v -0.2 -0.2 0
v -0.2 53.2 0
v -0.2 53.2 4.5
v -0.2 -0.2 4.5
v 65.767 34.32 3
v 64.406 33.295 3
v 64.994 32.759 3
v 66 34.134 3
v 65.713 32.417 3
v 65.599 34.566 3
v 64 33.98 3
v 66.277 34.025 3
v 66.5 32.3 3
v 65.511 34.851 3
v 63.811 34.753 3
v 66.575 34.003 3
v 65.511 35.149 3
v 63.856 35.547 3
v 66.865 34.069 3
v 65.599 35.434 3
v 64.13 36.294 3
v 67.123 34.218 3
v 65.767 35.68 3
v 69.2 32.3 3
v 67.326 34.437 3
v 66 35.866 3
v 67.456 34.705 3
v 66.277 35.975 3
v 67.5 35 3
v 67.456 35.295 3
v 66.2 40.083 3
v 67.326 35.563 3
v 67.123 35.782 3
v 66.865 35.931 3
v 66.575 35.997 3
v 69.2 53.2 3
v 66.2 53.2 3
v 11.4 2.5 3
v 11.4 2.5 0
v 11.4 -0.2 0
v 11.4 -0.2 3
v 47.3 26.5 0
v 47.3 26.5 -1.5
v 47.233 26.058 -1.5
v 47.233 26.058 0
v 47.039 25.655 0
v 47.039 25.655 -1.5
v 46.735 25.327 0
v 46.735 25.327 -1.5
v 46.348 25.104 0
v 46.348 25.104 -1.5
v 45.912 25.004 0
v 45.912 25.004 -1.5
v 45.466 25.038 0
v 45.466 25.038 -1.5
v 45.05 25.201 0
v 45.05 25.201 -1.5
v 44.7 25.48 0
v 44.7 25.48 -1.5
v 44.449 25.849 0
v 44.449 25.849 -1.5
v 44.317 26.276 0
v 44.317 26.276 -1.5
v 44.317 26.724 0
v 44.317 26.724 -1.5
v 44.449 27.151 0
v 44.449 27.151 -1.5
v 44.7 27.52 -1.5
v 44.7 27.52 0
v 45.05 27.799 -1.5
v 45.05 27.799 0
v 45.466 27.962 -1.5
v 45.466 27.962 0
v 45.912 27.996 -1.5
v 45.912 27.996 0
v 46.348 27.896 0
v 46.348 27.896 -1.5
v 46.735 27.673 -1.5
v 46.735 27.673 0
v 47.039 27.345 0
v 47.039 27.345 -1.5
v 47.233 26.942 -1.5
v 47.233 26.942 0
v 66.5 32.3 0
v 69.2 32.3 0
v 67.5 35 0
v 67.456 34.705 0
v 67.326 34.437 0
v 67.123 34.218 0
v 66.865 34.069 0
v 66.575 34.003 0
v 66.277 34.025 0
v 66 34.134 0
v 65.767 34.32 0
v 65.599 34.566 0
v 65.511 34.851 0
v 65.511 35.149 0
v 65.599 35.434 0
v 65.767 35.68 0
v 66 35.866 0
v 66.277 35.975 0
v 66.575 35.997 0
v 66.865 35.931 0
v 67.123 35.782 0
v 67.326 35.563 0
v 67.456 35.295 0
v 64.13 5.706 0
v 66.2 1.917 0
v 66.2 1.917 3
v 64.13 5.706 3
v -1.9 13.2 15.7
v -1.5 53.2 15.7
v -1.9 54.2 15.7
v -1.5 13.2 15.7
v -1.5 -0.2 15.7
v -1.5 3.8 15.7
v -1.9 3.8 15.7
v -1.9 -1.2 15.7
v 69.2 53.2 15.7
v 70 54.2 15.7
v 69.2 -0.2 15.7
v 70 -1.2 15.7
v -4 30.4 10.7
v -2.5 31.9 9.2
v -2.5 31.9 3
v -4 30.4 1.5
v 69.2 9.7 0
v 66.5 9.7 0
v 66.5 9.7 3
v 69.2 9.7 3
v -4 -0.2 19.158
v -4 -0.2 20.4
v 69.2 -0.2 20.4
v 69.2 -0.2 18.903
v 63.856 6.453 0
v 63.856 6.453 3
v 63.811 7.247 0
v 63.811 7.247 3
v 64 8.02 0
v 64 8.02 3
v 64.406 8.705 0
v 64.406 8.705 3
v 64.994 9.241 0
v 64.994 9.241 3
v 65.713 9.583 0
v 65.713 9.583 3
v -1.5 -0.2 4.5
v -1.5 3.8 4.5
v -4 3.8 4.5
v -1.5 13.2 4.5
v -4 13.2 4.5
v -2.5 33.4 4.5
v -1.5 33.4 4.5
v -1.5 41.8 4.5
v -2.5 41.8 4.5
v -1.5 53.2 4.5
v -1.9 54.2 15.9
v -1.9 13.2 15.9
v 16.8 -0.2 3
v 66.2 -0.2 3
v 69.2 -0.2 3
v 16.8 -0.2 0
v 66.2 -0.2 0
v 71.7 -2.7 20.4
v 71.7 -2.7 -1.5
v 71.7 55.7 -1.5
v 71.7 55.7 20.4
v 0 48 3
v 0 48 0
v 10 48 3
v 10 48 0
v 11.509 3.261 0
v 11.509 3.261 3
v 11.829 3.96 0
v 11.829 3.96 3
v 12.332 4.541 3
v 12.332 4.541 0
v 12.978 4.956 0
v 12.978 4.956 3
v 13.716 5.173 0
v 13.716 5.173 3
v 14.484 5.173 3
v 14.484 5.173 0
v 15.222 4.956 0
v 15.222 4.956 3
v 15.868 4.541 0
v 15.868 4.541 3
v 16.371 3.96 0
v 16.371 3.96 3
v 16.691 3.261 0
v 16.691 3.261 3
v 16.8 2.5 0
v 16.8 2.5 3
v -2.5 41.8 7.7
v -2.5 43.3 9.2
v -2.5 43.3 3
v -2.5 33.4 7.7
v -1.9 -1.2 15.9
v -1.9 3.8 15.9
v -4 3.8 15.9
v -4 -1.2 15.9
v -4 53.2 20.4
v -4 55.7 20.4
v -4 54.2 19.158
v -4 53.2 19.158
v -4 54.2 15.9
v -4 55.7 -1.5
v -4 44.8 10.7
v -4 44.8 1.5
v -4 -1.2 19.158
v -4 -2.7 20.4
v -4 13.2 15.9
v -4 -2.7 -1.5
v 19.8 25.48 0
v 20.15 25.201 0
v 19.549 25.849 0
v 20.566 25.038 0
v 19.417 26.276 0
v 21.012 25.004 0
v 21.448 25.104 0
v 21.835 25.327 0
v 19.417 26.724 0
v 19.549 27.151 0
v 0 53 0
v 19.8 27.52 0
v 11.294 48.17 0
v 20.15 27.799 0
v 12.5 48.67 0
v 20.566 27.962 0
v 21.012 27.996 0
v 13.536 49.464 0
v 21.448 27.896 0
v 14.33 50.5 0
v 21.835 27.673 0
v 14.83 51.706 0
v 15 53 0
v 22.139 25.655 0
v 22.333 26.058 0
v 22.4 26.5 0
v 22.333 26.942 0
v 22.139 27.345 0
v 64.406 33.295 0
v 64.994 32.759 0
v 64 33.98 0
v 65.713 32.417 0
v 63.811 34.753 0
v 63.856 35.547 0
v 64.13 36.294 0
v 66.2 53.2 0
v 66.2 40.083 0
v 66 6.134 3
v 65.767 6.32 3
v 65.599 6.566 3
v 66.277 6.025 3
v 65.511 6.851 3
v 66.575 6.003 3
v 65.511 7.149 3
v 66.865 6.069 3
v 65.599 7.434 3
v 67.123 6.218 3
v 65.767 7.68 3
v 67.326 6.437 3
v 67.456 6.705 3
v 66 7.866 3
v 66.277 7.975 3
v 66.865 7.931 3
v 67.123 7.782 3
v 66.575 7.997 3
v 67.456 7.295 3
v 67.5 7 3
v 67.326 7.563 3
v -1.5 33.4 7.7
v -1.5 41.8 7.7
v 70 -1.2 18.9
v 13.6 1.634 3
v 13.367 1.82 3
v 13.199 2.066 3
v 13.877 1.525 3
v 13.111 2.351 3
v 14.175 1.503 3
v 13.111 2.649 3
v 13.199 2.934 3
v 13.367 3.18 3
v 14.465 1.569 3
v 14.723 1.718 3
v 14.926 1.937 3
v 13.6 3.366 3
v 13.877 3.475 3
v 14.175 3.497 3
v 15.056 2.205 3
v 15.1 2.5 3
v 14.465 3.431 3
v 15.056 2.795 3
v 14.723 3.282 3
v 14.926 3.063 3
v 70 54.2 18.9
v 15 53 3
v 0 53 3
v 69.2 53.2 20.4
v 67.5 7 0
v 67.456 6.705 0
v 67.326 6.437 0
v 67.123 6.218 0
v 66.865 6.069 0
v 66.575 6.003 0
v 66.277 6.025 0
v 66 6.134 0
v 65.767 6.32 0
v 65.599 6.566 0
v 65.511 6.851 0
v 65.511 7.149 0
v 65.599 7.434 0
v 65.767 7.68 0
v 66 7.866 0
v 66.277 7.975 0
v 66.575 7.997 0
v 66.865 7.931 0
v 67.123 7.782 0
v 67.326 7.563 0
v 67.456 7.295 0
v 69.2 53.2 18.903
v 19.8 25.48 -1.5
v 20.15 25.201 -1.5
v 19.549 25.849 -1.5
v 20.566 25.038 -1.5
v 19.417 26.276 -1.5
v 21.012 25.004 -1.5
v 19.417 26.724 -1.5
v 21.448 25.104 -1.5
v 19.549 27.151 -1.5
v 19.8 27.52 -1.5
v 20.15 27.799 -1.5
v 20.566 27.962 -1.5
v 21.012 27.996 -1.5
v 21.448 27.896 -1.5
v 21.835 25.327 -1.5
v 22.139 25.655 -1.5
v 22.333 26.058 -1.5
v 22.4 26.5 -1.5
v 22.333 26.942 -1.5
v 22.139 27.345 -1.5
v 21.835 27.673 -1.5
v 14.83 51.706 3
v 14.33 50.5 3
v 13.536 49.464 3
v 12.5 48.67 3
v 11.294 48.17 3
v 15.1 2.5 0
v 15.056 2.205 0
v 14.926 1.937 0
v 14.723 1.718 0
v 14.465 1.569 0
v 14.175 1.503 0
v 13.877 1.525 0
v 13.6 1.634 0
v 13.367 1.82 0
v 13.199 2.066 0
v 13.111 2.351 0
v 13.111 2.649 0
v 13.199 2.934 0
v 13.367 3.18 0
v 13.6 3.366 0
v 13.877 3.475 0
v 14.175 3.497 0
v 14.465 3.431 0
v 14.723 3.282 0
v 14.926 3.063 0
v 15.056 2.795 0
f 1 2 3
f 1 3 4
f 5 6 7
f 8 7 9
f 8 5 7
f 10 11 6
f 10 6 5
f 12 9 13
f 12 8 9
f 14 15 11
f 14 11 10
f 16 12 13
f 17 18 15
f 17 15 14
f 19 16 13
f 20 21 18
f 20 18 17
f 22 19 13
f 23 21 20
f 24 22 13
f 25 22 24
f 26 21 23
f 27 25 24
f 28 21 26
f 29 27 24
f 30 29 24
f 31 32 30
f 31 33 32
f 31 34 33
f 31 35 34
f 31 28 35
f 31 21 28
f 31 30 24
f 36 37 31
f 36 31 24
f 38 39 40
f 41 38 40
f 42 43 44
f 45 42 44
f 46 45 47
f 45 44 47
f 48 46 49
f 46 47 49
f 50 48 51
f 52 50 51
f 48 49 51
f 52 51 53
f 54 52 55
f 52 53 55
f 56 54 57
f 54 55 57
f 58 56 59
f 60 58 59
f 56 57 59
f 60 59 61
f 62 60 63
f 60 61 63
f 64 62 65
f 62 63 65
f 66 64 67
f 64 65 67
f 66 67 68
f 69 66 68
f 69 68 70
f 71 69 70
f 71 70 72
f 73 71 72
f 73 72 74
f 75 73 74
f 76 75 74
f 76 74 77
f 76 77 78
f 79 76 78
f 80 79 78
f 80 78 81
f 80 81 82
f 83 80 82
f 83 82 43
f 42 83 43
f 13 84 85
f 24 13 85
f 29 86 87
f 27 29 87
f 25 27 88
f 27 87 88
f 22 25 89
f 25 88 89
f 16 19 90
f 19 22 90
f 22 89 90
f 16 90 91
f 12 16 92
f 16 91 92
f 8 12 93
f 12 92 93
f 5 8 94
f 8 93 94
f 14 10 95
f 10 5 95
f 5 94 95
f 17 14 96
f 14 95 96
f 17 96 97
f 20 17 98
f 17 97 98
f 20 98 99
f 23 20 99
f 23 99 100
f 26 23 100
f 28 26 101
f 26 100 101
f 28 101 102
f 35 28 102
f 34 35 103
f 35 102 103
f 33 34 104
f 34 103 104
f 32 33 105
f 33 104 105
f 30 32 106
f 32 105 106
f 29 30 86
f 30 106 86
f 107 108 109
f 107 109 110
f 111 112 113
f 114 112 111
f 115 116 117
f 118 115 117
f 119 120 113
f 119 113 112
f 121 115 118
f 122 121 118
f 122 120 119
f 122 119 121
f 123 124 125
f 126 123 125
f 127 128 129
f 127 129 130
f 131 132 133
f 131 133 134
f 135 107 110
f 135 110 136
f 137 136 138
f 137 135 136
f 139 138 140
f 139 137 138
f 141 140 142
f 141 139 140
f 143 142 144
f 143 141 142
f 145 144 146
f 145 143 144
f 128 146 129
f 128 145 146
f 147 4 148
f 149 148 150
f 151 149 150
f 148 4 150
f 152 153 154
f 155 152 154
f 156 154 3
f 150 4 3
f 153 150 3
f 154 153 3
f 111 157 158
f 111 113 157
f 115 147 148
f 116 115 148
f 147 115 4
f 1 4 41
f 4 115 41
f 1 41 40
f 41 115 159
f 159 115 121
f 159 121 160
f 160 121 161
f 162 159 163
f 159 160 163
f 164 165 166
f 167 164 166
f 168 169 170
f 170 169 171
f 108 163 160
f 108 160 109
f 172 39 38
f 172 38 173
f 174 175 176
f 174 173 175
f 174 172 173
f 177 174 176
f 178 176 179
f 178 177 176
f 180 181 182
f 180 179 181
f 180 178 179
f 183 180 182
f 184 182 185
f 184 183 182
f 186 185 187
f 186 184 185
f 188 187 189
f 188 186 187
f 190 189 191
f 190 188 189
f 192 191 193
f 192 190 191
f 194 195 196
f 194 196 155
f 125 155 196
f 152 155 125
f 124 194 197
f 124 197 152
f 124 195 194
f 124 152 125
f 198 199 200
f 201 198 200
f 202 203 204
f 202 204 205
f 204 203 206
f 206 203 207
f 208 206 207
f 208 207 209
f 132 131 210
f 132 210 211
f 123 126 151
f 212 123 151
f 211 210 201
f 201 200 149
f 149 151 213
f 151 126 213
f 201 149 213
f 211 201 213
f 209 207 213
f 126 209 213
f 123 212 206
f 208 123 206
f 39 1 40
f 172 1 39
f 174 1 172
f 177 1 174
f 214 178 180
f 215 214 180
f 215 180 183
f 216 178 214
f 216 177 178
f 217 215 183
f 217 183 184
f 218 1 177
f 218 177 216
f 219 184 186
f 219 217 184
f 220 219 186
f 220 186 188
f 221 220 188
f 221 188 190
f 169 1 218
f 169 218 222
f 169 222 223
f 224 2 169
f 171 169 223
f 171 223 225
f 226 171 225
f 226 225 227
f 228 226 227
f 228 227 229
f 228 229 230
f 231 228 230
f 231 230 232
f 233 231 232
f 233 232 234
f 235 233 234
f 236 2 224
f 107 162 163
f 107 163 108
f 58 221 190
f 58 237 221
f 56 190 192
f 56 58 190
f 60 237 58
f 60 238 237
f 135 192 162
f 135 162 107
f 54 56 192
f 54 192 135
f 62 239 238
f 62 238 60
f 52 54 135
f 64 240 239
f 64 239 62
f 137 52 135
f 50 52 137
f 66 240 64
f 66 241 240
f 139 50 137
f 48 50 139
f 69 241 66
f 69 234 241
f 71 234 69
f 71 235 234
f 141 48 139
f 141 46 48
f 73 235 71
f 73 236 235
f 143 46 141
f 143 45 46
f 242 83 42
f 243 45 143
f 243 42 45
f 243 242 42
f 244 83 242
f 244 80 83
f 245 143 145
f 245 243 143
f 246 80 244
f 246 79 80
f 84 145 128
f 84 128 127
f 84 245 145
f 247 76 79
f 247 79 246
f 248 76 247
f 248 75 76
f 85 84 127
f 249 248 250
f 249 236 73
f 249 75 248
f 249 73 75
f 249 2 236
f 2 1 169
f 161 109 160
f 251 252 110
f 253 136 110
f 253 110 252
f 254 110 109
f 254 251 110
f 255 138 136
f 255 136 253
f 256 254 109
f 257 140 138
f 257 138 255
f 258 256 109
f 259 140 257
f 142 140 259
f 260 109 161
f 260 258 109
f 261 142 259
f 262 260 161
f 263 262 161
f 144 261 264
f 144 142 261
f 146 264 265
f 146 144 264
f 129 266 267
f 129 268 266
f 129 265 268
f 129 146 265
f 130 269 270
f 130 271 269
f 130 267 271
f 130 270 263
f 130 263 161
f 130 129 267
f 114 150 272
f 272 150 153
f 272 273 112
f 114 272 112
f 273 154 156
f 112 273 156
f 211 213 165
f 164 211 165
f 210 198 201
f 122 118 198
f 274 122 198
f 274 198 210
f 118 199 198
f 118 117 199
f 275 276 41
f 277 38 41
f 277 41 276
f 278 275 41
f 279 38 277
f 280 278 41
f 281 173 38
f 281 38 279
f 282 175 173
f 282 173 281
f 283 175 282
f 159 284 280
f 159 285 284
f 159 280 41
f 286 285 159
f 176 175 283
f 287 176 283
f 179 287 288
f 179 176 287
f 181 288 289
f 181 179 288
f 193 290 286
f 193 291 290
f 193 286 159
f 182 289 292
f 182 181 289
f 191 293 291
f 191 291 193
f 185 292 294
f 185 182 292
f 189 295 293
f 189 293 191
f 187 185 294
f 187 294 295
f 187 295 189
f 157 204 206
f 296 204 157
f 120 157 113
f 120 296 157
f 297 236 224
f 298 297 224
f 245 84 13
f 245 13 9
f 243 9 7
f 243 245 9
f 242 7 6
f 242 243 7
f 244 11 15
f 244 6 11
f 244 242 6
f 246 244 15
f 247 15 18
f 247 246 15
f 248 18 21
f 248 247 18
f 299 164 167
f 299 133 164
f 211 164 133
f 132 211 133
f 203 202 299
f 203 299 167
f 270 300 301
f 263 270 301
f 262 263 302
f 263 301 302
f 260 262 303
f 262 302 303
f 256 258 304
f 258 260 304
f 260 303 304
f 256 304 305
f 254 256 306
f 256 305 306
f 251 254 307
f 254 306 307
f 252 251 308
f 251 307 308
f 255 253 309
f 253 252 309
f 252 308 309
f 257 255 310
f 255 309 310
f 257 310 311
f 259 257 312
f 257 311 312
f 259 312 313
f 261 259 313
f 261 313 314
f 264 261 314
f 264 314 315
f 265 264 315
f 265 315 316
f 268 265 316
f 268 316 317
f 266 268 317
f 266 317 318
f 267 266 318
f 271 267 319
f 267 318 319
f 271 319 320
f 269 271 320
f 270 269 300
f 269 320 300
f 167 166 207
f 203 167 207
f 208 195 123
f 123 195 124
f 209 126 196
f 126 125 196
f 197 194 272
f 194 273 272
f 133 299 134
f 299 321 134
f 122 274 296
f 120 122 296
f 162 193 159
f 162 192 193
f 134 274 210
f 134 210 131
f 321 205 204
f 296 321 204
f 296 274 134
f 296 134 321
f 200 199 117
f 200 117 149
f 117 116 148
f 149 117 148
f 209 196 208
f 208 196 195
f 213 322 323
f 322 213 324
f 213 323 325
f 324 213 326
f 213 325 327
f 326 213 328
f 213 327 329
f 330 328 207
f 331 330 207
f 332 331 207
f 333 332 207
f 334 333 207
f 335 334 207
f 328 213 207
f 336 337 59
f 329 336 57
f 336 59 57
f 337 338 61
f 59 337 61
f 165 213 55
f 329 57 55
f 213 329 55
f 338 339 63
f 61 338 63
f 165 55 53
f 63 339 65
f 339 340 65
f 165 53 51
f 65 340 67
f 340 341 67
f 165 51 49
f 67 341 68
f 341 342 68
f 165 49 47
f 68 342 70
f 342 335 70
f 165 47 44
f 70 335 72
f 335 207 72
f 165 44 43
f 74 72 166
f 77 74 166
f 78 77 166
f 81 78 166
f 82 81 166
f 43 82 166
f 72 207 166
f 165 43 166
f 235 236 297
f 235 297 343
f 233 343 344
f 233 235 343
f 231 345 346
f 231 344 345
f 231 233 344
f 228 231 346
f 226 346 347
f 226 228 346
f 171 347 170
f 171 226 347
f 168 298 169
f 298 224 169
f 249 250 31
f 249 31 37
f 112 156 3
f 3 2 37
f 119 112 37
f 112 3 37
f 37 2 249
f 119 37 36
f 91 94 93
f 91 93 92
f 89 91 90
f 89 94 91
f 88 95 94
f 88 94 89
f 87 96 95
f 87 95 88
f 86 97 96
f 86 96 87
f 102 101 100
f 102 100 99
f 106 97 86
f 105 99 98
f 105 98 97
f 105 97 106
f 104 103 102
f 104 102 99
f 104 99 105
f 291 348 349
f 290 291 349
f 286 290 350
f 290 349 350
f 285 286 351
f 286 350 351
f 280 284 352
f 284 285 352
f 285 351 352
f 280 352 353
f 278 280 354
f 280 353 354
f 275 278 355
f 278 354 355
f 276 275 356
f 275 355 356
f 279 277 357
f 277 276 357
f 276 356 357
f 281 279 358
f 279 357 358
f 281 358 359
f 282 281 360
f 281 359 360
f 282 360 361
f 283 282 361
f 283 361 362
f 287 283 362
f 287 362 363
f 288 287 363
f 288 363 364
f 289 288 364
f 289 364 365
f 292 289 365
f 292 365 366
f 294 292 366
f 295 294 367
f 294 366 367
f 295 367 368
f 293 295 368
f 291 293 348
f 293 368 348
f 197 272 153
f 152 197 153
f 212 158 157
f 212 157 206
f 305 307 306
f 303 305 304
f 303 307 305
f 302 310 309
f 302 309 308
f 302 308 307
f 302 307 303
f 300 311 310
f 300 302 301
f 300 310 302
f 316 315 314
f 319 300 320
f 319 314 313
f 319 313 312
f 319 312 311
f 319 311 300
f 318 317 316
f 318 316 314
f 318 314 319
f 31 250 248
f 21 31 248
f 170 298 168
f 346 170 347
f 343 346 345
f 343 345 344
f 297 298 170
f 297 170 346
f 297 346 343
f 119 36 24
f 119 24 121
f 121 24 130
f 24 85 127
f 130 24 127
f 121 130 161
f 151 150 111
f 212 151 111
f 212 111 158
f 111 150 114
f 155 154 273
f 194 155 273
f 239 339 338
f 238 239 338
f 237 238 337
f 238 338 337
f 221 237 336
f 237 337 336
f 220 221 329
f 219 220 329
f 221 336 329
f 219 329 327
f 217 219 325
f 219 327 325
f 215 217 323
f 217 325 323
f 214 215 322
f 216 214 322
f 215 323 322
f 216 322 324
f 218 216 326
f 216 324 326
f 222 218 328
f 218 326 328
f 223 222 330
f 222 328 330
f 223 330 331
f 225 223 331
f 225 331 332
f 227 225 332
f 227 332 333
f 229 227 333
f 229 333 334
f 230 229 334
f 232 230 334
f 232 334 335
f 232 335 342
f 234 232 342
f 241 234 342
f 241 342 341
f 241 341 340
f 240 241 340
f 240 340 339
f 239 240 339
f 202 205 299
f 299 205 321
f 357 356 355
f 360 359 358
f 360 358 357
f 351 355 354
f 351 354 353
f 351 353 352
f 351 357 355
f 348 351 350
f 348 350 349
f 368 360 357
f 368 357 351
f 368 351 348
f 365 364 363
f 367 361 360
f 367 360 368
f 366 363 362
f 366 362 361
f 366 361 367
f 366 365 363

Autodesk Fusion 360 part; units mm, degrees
sketch "Esquisse1" plane through (0, 0, 0) normal (0, 0, 1) x (1, 0, 0)
  line L0 (0, 0) -> (66, 0) construction
  line L1 (66, 53) -> (0, 53) construction
  line L2 (0, 53) -> (0, 0) construction
  line L3 (66, 0) -> (66, 2) construction
  line L4 (66, 2) -> (69, 5) construction
  line L5 (69, 5) -> (69, 37) construction
  line L6 (69, 37) -> (66, 40) construction
  line L7 (66, 40) -> (66, 53) construction
  line L8 (-0.2, -0.2) -> (66.2, -0.2)
  line L9 (66.2, -0.2) -> (66.2, 1.9172)
  line L10 (66.2, 1.9172) -> (69.2, 4.9172)
  line L11 (69.2, 4.9172) -> (69.2, 37.0828)
  line L12 (69.2, 37.0828) -> (66.2, 40.0828)
  line L13 (66.2, 40.0828) -> (66.2, 53.2)
  line L14 (66.2, 53.2) -> (-0.2, 53.2)
  line L15 (-0.2, 53.2) -> (-0.2, -0.2)
  dimension "d1" = 66
  dimension "d2" = 53
  dimension "d6" = 37
  dimension "d7" = 40
  dimension "d10" = 3
  dimension "d11" = 3
  dimension "d12" = 2
  dimension "d24" = 0.2
sketch "Esquisse2" plane through (0, 0, 0) normal (0, 0, 1) x (1, 0, 0)
  circle A0 centre (14.1, 2.5) radius 1
  circle A1 centre (66.5, 35) radius 1
  circle A2 centre (66.5, 7) radius 1
  line L0 (0, 53) -> (0, 0)
  line L1 (66, 53) -> (0, 53)
  line L2 (69, 5) -> (69, 37)
  line L3 (66.5, 7) -> (66.5, 35) construction
  line L4 (0, 0) -> (66, 0) construction
  circle A3 centre (14.1, 2.5) radius 2.7
  circle A4 centre (66.5, 35) radius 2.7
  circle A5 centre (66.5, 7) radius 2.7
  line L5 (69.2, 37.0828) -> (66.2, 40.0828)
  line L6 (66.2, 40.0828) -> (66.2, 53.2)
  line L7 (66.2, 40.0828) -> (64.1305, 36.2944)
  line L8 (69.2, 4.9172) -> (69.2, 37.0828)
  line L9 (66.5, 32.3) -> (69.2, 32.3)
  arc A6 (64.1305, 36.2944) -> (66.5, 32.3) centre (66.5, 35) ccw
  line L10 (66.2, 1.9172) -> (69.2, 4.9172)
  line L11 (66.2, -0.2) -> (66.2, 1.9172)
  line L12 (66.2, 1.9172) -> (64.1305, 5.7056)
  line L13 (66.5, 9.7) -> (69.2, 9.7)
  arc A7 (66.5, 9.7) -> (64.1305, 5.7056) centre (66.5, 7) ccw
  line L14 (-0.2, -0.2) -> (66.2, -0.2)
  line L15 (16.8, 2.5) -> (16.8, -0.2)
  line L16 (11.4, 2.5) -> (11.4, -0.2)
  arc A8 (16.8, 2.5) -> (11.4, 2.5) centre (14.1, 2.5) ccw
  line L17 (0, 48) -> (10, 48)
  line L18 (10, 48) -> (10, 53) construction
  arc A9 (10, 48) -> (15, 53) centre (10, 53) ccw
  dimension "d14" = 2
  dimension "d15" = 2
  dimension "d16" = 2
  dimension "d17" = 14.1
  dimension "d20" = 2.5
  dimension "d21" = 7
  dimension "d22" = 2
  dimension "d33" = 1.7
  dimension "d34" = 2.5
  dimension "d45" = 5
  dimension "d46" = 10
  dimension "d85" = 2.7
sketch "Esquisse3" plane through (0, 0, 0) normal (0, 0, 1) x (1, 0, 0)
  line L0 (-4, -1.7) -> (70.7, -1.7)
  line L1 (70.7, -1.7) -> (70.7, 54.7)
  line L2 (70.7, 54.7) -> (-4, 54.7)
  line L3 (-4, 54.7) -> (-4, -1.7)
  line L4 (-0.2, -0.2) -> (66.2, -0.2)
  line L5 (69.2, 4.9172) -> (69.2, 37.0828)
  line L6 (-5, -2.7) -> (71.7, -2.7)
  line L7 (71.7, -2.7) -> (71.7, 55.7)
  line L8 (71.7, 55.7) -> (-5, 55.7)
  line L9 (-5, 55.7) -> (-5, -2.7)
  dimension "d26" = 56.4
  dimension "d27" = 1.5
  dimension "d28" = 74.7
  dimension "d29" = 1.5
  dimension "d52" = 1
extrude "Extrusion1" add sketch "Esquisse3" against normal blind 1.5 contours L0 L1 L2 L3
sketch "Esquisse4" plane through (0, 0, 0) normal (0, 0, 1) x (-1, 0, 0)
  line L0 (4, -54.7) -> (4, 1.7)
  line L1 (4, 1.7) -> (-70.7, 1.7)
  line L2 (-70.7, 1.7) -> (-70.7, -54.7)
  line L3 (-70.7, -54.7) -> (4, -54.7)
  line L4 (4, -54.7) -> (-70.7, -54.7)
  line L5 (-70.7, -54.7) -> (-70.7, 1.7)
  line L6 (-70.7, 1.7) -> (4, 1.7)
  line L7 (4, 1.7) -> (4, -54.7)
  line L8 (2.5, -53.2) -> (-69.2, -53.2)
  line L9 (-69.2, -53.2) -> (-69.2, 0.2)
  line L10 (-69.2, 0.2) -> (2.5, 0.2)
  line L11 (2.5, 0.2) -> (2.5, -53.2)
  line L12 (-66.2, 0.2) -> (-66.2, -1.9172)
  line L13 (-66.2, -1.9172) -> (-69.2, -4.9172)
  line L14 (-66.2, -40.0828) -> (-66.2, -53.2)
  line L15 (-69.2, -37.0828) -> (-66.2, -40.0828)
  line L16 (0.2, -53.2) -> (0.2, 0.2)
  dimension "d32" = 1.5
extrude "Extrusion2" add sketch "Esquisse2" along normal blind 2 contours A1 | A2 | L2 A5 A7 | A5 L8 L10 L12 | L2 A5 | L2 A5 L13 | L2 A5 L8 L13 | L2 A4 L9 | L2 A4 L8 L9 | L2 A4 A6 | L2 A4 | A4 L5 L7 L8 | A3 A8 | A3 L14 L15 | A3 L14 L16
extrude "Extrusion3" cut 3 faces at (14.0751, 0.3676, 2) (66.6102, 6.7743, 2) (66.6102, 35.2257, 2) along direction (0, 0, -1) blind 2
extrude "Extrusion4" add sketch "Esquisse2" sketch "Esquisse4" along normal blind 3 contours L2 A5 A7 | A5 L8 L10 L12 | L2 A5 | L2 A5 L13 | L2 A5 L8 L13 | L2 A4 L9 | L2 A4 L8 L9 | L2 A4 A6 | L2 A4 | A4 L5 L7 L8 | A3 A8 | A3 L14 L15 | A3 L14 L16 of sketch 2 contours L8 L9 L14 L15 | L9 L10 L12 L13
extrude "Extrusion5" add sketch "Esquisse4" along normal blind 4.5 contours L8 L10 L11 L16
extrude "Extrusion6" add sketch "Esquisse3" sketch "Esquisse4" along normal blind 20.4 and the other way up to surface of sketch 2 second end surface through (0, 0, -1.5) normal (0, 0, -1) offset 0
extrude "Extrusion7" add sketch "Esquisse2" along normal blind 3 contours L0 L1 L17 A9
sketch "Esquisse5" plane through (0, 0, -1.5) normal (0, 0, -1) x (1, 0, 0)
  line L0 (70.7, -26.5) -> (-4, -26.5) construction
  circle A0 centre (45.8, -26.5) radius 1.5
  circle A1 centre (20.9, -26.5) radius 1.5
  line L1 (20.9, -28) -> (-4, -28) construction
  line L2 (20.9, -28) -> (45.8, -28) construction
  line L3 (45.8, -28) -> (70.7, -28) construction
  line L4 (71.7, 2.7) -> (-5, 2.7)
  line L5 (-5, 2.7) -> (-5, -55.7)
  line L6 (-5, -55.7) -> (71.7, -55.7)
  line L7 (71.7, -55.7) -> (71.7, 2.7)
  dimension "d49" = 3
extrude "Extrusion8" cut sketch "Esquisse5" against normal blind 1.5 contours A0 | A1
extrude "Extrusion11" add 1 faces at (-2.5, 17.6, 9.8) along direction (1, 0, 0) blind 1
extrude "Extrusion12" cut 1 faces at (-5, 36.2333, 5.8) along direction (1, 0, 0) blind 1
sketch "Esquisse10" plane through (-1.5, 0, 0) normal (1, 0, 0) x (0, 1, 0)
  line L0 (-0.2, 4.5) -> (53.2, 4.5)
  line L1 (53.2, 4.5) -> (53.2, 20.4)
  line L2 (53.2, 20.4) -> (-0.2, 20.4)
  line L3 (-0.2, 20.4) -> (-0.2, 4.5)
  line L4 (-1.2, 18.9) -> (54.2, 18.9)
  line L5 (54.2, 18.9) -> (54.2, 15.7)
  line L6 (54.2, 15.7) -> (-1.2, 15.7)
  line L7 (-1.2, 15.7) -> (-1.2, 18.9)
  line L8 (26.5, 18.9) -> (26.5, 20.4) construction
  line L9 (-0.2, 18.9) -> (-0.2, 20.4)
  line L10 (-0.2, 20.4) -> (53.2, 20.4)
  dimension "d89" = 1.5
  dimension "d90" = 3.2
  dimension "d93" = 55.4
extrude "Extrusion17" cut sketch "Esquisse10" against normal up to surface (2.5 mm away) contours L3 L4 L6 L7 | L1 L3 L4 L6 | L1 L4 L5 L6 | L1 L2 L3 L4 L9 L10
extrude "Extrusion18" cut sketch "Esquisse10" along normal blind 71.5 contours L3 L4 L6 L7 | L1 L3 L4 L6 | L1 L4 L5 L6
sketch "Esquisse11" plane through (0, 0, 15.7) normal (0, 0, 1) x (-1, 0, 0)
  line L0 (-70, -54.2) -> (4, -54.2)
  line L1 (4, -54.2) -> (4, 1.2)
  line L2 (4, 1.2) -> (-70, 1.2)
  line L3 (-70, 1.2) -> (-70, -54.2)
  line L4 (1.5, -53.2) -> (-69.2, -53.2)
  line L5 (-69.2, -53.2) -> (-69.2, 0.2)
  line L6 (-69.2, 0.2) -> (1.5, 0.2)
  line L7 (1.5, 0.2) -> (1.5, -53.2)
  line L8 (1.9, -54.2) -> (1.9, 1.2)
  dimension "d98" = 71.9
extrude "Extrusion19" add sketch "Esquisse11" along normal blind 0.2 contours L0 L1 L2 L8
sketch "Esquisse7" plane through (-1.5, 0, 0) normal (1, 0, 0) x (0, 1, 0)
  line L0 (-0.2, 15.7) -> (-0.2, 4.5)
  line L1 (-0.2, 4.5) -> (53.2, 4.5)
  line L2 (53.2, 4.5) -> (53.2, 15.7)
  line L3 (3.8, 4.5) -> (13.2, 4.5)
  line L4 (13.2, 4.5) -> (13.2, 15.9)
  line L5 (13.2, 15.9) -> (3.8, 15.9)
  line L6 (3.8, 15.9) -> (3.8, 4.5)
  line L7 (33.4, 4.5) -> (41.8, 4.5)
  line L8 (41.8, 4.5) -> (41.8, 7.7)
  line L9 (41.8, 7.7) -> (33.4, 7.7)
  line L10 (33.4, 7.7) -> (33.4, 4.5)
  line L11 (53.2, 15.7) -> (-0.2, 15.7)
  dimension "d66" = 9.4
  dimension "d67" = 11.4
  dimension "d68" = 4
  dimension "d71" = 8.4
  dimension "d72" = 3.2
  dimension "d73" = 11.4
extrude "Extrusion14" cut sketch "Esquisse7" against normal blind 2.5 contours L1 L3 L4 L6 L11 | L4 L5 L6 L11 | L1 L7 L8 L9 L10
sketch "Esquisse8" plane through (-4, 0, 0) normal (-1, 0, 0) x (0, -1, 0)
  line L0 (-3.8, 4.5) -> (-13.2, 4.5)
  line L1 (-13.2, 4.5) -> (-13.2, 15.9)
  line L2 (-3.8, 15.9) -> (-3.8, 4.5)
  line L3 (-33.4, 4.5) -> (-41.8, 4.5)
  line L4 (-41.8, 4.5) -> (-41.8, 7.7)
  line L5 (-41.8, 7.7) -> (-33.4, 7.7)
  line L6 (-33.4, 7.7) -> (-33.4, 4.5)
  line L7 (-53.2, 20.4) -> (-55.7, 20.4)
  line L8 (-55.7, -1.5) -> (2.7, -1.5)
  line L9 (-31.9, 3) -> (-43.3, 3)
  line L10 (-43.3, 3) -> (-43.3, 9.2)
  line L11 (-43.3, 9.2) -> (-31.9, 9.2)
  line L12 (-31.9, 9.2) -> (-31.9, 3)
  line L13 (2.7, -1.5) -> (2.7, 20.4)
  line L14 (-55.7, 20.4) -> (-55.7, -1.5)
  line L15 (-13.2, 15.9) -> (-54.2, 15.9)
  line L16 (-54.2, 15.9) -> (-54.2, 18.9)
  line L17 (-54.2, 18.9) -> (-53.2, 18.9)
  line L18 (-53.2, 18.9) -> (-53.2, 20.4)
  line L19 (2.7, 20.4) -> (0.2, 20.4)
  line L20 (0.2, 20.4) -> (0.2, 18.9)
  line L21 (0.2, 18.9) -> (1.2, 18.9)
  line L22 (1.2, 18.9) -> (1.2, 15.9)
  line L23 (1.2, 15.9) -> (-3.8, 15.9)
  dimension "d79" = -1.5
extrude "Extrusion16" cut sketch "Esquisse8" against normal blind 1.5 contours L9 L10 L11 L12
chamfer "Chanfrein1" distance 1.5 angle 45 4 edges at (-4, 31.9, 6.1) (-4, 37.6, 9.2) (-4, 43.3, 6.1) (-4, 37.6, 3)
draft "Dépouille1" angle 0.2 neutral plane through (70, 0, 0) pull (-1, 0, 0) 1 faces at (45.0667, -0.8667, 18.9)
equation "d1 = longArduino"
equation "d2 = largArduino"
equation "longArduino = 66 mm"
equation "largArduino = 53 mm"
equation "d6 = longEncoche - largEncoche"
equation "d7 = longEncoche"
equation "longEncoche = 40 mm"
equation "largEncoche = 3 mm"
equation "d10 = largEncoche"
equation "d11 = largEncoche"
equation "percageArduino = 2 mm"
equation "d14 = percageArduino"
equation "d15 = percageArduino"
equation "d16 = percageArduino"
equation "decalagePercage = 2.5 mm"
equation "d20 = decalagePercage"
equation "decalageImpression = 0.2 mm"
equation "d24 = decalageImpression"
equation "epaisseurBoitier = 1.5 mm"
equation "d26 = largArduino + ( epaisseurBoitier + decalageImpression ) * 2"
equation "d27 = epaisseurBoitier"
equation "d28 = longArduino + largEncoche + epaisseurBoitier + decalageImpression + 4 mm"
equation "d29 = epaisseurBoitier"
equation "d33 = epaisseurBoitier + decalageImpression"
equation "d34 = decalagePercage"
equation "d41 = 3 mm + 1.5 mm"
equation "d43 = 20 mm - 1.3 mm + epaisseurBoitier + decalageImpression"
equation "largPriseDC = 9 mm"
equation "longPriseDC = 11 mm"
equation "d66 = largPriseDC + decalageImpression * 2"
equation "d67 = longPriseDC + decalageImpression * 2"
equation "largPriseUSB = 3 mm"
equation "longPriseUSB = 8 mm"
equation "d71 = longPriseUSB + decalageImpression * 2"
equation "d72 = largPriseUSB + decalageImpression"
equation "epaisseurPlexi = 3 mm"
equation "d89 = epaisseurBoitier"
equation "d90 = epaisseurPlexi + decalageImpression"
equation "largeurPlexi = 55 mm"
equation "longueurPlexi = 71.5 mm"
equation "d93 = largeurPlexi + decalageImpression * 2"
equation "d96 = longueurPlexi"
equation "d98 = longueurPlexi + decalageImpression * 2"
equation "d99 = decalageImpression"
